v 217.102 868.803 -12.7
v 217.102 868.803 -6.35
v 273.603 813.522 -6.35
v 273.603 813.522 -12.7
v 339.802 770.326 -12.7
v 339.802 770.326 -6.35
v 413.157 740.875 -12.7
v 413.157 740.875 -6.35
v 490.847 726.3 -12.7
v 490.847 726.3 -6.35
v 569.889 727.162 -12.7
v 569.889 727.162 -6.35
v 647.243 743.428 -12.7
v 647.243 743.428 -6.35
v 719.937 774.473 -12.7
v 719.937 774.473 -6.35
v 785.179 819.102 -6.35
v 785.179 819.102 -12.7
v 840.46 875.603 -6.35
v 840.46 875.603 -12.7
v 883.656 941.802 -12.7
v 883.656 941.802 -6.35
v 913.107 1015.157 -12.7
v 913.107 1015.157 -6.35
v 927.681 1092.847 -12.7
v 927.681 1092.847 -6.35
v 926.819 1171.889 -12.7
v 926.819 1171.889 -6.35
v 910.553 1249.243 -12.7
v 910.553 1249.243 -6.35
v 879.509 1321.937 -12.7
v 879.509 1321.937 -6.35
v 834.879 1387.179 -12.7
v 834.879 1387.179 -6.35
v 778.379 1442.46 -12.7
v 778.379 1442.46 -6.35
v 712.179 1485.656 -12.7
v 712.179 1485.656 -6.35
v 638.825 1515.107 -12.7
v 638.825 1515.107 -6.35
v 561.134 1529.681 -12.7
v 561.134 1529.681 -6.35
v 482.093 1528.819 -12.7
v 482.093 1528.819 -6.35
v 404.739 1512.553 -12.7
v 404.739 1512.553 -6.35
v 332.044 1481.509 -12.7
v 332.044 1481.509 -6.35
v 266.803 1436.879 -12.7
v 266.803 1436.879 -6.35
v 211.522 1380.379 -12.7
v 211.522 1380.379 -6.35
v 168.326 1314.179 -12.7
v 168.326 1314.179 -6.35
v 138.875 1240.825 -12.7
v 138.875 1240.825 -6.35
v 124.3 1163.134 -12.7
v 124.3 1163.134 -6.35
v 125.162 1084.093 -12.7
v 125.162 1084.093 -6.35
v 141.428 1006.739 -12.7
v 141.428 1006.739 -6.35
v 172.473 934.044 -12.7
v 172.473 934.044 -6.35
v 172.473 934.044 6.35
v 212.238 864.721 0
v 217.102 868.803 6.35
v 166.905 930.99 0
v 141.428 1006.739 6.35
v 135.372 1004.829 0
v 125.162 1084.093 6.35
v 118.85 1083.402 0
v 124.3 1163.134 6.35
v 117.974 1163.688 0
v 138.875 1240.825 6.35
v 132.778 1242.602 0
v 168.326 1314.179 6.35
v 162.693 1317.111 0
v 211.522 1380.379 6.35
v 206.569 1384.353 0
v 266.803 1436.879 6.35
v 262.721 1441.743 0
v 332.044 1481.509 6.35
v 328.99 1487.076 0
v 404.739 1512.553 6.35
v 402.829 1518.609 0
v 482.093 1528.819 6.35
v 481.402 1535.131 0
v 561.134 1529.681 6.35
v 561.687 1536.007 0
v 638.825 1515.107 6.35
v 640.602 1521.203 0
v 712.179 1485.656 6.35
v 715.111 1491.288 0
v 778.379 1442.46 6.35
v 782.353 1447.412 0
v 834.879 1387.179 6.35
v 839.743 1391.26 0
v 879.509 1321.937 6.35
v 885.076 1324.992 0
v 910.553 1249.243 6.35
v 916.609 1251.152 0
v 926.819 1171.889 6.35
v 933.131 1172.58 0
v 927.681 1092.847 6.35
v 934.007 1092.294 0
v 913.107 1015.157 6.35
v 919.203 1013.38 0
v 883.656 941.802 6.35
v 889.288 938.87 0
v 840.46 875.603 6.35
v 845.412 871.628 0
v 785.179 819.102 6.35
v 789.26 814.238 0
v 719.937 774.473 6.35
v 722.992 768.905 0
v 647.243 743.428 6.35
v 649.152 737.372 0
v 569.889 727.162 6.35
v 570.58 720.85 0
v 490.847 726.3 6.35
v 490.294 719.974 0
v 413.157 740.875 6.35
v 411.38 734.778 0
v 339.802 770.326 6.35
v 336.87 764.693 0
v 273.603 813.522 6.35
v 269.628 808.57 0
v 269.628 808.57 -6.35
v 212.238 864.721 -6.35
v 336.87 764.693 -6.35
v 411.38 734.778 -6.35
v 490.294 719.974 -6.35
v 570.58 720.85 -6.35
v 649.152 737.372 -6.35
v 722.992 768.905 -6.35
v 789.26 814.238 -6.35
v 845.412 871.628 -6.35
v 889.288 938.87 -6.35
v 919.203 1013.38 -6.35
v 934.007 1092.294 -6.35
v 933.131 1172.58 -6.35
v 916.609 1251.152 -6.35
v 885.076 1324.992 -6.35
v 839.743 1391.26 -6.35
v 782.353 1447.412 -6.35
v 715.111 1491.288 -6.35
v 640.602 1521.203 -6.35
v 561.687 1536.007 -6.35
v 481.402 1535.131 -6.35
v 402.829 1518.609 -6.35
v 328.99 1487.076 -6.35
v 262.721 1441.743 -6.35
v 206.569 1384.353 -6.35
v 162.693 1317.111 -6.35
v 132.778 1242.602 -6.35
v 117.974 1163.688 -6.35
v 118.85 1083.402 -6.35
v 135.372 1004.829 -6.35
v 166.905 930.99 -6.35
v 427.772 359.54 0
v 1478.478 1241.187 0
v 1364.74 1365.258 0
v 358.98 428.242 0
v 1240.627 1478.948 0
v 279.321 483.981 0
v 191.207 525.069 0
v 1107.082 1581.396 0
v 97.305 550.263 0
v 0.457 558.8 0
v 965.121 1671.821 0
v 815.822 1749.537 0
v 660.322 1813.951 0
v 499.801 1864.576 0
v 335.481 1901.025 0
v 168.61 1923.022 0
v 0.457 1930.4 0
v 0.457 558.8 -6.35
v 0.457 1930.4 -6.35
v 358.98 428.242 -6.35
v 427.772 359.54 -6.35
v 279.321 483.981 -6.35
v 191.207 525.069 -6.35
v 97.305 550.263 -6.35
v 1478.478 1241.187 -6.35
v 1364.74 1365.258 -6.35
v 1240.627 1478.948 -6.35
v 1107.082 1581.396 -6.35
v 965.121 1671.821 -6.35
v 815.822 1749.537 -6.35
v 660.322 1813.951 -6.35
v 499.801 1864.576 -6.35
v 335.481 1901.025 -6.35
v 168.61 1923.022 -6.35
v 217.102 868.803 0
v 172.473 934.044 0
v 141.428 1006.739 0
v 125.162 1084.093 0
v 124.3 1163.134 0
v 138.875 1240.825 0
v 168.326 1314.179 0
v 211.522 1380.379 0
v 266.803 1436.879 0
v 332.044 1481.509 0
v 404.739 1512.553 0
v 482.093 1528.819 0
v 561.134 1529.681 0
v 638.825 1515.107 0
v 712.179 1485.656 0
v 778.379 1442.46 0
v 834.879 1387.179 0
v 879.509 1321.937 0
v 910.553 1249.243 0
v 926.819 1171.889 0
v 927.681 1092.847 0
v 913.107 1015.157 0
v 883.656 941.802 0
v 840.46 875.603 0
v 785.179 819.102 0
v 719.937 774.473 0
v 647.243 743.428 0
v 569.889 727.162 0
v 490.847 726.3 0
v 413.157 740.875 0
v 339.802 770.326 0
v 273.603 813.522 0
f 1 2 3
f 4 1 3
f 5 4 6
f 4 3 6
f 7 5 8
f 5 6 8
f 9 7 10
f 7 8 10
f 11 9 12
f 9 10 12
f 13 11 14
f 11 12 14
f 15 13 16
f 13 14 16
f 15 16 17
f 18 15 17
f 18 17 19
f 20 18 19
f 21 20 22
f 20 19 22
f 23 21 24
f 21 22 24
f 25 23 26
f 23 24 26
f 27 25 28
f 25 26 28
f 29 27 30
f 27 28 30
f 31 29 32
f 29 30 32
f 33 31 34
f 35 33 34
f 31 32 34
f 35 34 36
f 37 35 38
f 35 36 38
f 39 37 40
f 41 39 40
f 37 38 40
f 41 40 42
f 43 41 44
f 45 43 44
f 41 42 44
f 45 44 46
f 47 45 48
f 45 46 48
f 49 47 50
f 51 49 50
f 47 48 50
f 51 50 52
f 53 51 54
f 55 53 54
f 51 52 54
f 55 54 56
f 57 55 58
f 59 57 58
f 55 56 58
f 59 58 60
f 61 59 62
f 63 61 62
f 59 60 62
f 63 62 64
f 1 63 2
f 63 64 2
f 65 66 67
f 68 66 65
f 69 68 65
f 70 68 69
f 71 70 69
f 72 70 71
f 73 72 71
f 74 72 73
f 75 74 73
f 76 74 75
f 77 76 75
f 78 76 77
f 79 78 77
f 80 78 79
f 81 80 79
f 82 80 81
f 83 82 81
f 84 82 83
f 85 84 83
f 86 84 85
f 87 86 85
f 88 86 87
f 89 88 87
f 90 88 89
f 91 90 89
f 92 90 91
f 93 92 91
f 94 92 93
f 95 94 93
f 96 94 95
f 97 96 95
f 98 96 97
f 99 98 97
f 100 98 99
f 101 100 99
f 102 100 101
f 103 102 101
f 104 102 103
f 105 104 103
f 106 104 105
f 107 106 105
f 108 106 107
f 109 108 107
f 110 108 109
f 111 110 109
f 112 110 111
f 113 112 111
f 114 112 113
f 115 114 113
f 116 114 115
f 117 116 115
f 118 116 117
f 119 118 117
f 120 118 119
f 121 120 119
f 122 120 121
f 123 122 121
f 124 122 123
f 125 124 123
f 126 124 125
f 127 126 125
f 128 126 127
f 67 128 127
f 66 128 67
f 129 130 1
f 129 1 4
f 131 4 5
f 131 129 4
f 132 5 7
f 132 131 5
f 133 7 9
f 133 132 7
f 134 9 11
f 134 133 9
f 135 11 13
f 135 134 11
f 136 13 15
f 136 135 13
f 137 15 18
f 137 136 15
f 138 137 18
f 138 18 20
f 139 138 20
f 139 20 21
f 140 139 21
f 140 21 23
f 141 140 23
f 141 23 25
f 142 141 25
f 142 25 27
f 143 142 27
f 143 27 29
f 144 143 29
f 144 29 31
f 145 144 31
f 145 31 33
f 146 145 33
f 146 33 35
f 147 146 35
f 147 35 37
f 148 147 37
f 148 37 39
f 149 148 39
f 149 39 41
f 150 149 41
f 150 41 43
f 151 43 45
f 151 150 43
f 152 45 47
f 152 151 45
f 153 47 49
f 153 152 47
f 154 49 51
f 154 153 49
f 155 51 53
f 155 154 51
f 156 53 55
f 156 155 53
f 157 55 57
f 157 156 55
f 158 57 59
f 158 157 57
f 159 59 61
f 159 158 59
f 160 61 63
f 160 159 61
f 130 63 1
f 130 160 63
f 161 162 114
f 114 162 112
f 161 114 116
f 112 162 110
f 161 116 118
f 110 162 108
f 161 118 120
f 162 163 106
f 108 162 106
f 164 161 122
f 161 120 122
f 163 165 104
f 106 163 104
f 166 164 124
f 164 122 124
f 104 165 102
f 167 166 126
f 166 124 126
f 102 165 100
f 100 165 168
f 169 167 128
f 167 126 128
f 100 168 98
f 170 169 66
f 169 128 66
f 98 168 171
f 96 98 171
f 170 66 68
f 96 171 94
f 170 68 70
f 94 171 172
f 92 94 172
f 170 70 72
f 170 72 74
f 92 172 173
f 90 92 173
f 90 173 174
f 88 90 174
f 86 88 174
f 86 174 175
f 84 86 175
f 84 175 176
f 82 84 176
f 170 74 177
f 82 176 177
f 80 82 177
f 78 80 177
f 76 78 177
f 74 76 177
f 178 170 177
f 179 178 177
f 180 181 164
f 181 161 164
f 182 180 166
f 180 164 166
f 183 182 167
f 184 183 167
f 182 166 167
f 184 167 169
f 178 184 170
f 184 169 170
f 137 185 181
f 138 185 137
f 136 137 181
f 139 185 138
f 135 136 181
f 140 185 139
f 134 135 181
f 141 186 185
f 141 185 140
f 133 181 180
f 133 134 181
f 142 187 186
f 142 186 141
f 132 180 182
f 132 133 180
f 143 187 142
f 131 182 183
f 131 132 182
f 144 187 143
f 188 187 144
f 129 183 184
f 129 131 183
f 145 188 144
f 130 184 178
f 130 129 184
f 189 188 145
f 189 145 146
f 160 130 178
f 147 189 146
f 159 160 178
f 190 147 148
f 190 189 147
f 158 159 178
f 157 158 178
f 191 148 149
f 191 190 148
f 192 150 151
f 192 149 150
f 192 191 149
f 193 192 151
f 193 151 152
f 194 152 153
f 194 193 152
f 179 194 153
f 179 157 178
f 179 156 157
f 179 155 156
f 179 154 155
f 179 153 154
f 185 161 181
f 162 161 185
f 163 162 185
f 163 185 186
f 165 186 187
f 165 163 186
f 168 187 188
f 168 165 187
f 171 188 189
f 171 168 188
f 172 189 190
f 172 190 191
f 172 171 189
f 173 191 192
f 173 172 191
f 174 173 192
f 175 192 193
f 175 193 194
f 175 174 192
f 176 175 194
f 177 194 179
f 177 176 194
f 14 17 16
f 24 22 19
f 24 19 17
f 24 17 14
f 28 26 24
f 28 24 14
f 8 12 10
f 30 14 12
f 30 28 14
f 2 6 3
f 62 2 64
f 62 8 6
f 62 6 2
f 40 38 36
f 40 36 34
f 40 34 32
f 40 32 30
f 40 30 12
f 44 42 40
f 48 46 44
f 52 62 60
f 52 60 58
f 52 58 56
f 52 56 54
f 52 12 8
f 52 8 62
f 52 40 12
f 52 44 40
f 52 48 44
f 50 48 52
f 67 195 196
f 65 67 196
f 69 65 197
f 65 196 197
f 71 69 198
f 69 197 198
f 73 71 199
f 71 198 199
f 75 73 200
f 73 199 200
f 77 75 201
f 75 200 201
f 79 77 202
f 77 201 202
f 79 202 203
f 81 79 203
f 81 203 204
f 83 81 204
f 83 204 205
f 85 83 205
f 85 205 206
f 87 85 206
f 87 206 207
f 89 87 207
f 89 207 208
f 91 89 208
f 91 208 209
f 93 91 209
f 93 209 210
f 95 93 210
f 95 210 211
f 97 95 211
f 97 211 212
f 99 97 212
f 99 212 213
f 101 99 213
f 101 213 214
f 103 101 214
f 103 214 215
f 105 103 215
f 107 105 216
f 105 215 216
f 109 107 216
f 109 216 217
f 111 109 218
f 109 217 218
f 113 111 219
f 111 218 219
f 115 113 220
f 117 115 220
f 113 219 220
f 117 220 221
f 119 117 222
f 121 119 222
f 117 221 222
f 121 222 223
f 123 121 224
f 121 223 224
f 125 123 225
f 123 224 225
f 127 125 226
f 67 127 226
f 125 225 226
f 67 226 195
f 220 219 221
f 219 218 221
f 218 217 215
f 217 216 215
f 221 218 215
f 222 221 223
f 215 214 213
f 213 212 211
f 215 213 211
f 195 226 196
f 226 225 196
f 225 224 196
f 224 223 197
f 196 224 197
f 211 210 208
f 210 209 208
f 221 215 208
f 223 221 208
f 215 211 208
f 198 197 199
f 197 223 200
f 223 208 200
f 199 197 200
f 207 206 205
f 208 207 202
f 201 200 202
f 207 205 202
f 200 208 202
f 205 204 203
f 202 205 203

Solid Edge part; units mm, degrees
sketch "Sketch1" plane through (0, 0, 0) normal (0, 0, 1) x (1, 0, 0)
  arc A0 (427.7716, 359.5398) -> (0.4572, 558.7998) centre (0, 0) ccw
  line L0 (0.4572, 558.7998) -> (0.4572, 1930.3999)
  arc A1 (1478.4783, 1241.1874) -> (0.4572, 1930.3999) centre (0, 0) ccw
  line L1 (427.7716, 359.5398) -> (1478.4783, 1241.1874)
extrude "Protrusion1" add sketch "Sketch1" against normal blind 6.35
sketch "Sketch2" plane through (739.4677, 1144.9699, 0) normal (0, 0, 1) x (-0.766, -0.6428, 0)
  circle A0 centre (174.4469, -124.2136) radius 409.575
  circle A1 centre (174.4469, -124.2136) radius 403.225
extrude "ExtrudedProtrusion_4" add sketch "Sketch2" along normal blind 12.7
chamfer "Chamfer_1" distance 12.7 angle 45 1 edges at (839.7433, 1391.2604, 12.7)
sketch "Sketch3" plane through (739.4677, 1144.9699, -6.35) normal (0, 0, -1) x (-0.766, -0.6428, 0)
  circle A0 centre (174.4469, 124.2136) radius 409.575
  circle A1 centre (174.4469, 124.2136) radius 403.225
extrude "ExtrudedProtrusion_7" add sketch "Sketch3" along normal blind 12.7
chamfer "Chamfer_4" distance 12.7 angle 45 1 edges at (839.7433, 1391.2604, -19.05)
